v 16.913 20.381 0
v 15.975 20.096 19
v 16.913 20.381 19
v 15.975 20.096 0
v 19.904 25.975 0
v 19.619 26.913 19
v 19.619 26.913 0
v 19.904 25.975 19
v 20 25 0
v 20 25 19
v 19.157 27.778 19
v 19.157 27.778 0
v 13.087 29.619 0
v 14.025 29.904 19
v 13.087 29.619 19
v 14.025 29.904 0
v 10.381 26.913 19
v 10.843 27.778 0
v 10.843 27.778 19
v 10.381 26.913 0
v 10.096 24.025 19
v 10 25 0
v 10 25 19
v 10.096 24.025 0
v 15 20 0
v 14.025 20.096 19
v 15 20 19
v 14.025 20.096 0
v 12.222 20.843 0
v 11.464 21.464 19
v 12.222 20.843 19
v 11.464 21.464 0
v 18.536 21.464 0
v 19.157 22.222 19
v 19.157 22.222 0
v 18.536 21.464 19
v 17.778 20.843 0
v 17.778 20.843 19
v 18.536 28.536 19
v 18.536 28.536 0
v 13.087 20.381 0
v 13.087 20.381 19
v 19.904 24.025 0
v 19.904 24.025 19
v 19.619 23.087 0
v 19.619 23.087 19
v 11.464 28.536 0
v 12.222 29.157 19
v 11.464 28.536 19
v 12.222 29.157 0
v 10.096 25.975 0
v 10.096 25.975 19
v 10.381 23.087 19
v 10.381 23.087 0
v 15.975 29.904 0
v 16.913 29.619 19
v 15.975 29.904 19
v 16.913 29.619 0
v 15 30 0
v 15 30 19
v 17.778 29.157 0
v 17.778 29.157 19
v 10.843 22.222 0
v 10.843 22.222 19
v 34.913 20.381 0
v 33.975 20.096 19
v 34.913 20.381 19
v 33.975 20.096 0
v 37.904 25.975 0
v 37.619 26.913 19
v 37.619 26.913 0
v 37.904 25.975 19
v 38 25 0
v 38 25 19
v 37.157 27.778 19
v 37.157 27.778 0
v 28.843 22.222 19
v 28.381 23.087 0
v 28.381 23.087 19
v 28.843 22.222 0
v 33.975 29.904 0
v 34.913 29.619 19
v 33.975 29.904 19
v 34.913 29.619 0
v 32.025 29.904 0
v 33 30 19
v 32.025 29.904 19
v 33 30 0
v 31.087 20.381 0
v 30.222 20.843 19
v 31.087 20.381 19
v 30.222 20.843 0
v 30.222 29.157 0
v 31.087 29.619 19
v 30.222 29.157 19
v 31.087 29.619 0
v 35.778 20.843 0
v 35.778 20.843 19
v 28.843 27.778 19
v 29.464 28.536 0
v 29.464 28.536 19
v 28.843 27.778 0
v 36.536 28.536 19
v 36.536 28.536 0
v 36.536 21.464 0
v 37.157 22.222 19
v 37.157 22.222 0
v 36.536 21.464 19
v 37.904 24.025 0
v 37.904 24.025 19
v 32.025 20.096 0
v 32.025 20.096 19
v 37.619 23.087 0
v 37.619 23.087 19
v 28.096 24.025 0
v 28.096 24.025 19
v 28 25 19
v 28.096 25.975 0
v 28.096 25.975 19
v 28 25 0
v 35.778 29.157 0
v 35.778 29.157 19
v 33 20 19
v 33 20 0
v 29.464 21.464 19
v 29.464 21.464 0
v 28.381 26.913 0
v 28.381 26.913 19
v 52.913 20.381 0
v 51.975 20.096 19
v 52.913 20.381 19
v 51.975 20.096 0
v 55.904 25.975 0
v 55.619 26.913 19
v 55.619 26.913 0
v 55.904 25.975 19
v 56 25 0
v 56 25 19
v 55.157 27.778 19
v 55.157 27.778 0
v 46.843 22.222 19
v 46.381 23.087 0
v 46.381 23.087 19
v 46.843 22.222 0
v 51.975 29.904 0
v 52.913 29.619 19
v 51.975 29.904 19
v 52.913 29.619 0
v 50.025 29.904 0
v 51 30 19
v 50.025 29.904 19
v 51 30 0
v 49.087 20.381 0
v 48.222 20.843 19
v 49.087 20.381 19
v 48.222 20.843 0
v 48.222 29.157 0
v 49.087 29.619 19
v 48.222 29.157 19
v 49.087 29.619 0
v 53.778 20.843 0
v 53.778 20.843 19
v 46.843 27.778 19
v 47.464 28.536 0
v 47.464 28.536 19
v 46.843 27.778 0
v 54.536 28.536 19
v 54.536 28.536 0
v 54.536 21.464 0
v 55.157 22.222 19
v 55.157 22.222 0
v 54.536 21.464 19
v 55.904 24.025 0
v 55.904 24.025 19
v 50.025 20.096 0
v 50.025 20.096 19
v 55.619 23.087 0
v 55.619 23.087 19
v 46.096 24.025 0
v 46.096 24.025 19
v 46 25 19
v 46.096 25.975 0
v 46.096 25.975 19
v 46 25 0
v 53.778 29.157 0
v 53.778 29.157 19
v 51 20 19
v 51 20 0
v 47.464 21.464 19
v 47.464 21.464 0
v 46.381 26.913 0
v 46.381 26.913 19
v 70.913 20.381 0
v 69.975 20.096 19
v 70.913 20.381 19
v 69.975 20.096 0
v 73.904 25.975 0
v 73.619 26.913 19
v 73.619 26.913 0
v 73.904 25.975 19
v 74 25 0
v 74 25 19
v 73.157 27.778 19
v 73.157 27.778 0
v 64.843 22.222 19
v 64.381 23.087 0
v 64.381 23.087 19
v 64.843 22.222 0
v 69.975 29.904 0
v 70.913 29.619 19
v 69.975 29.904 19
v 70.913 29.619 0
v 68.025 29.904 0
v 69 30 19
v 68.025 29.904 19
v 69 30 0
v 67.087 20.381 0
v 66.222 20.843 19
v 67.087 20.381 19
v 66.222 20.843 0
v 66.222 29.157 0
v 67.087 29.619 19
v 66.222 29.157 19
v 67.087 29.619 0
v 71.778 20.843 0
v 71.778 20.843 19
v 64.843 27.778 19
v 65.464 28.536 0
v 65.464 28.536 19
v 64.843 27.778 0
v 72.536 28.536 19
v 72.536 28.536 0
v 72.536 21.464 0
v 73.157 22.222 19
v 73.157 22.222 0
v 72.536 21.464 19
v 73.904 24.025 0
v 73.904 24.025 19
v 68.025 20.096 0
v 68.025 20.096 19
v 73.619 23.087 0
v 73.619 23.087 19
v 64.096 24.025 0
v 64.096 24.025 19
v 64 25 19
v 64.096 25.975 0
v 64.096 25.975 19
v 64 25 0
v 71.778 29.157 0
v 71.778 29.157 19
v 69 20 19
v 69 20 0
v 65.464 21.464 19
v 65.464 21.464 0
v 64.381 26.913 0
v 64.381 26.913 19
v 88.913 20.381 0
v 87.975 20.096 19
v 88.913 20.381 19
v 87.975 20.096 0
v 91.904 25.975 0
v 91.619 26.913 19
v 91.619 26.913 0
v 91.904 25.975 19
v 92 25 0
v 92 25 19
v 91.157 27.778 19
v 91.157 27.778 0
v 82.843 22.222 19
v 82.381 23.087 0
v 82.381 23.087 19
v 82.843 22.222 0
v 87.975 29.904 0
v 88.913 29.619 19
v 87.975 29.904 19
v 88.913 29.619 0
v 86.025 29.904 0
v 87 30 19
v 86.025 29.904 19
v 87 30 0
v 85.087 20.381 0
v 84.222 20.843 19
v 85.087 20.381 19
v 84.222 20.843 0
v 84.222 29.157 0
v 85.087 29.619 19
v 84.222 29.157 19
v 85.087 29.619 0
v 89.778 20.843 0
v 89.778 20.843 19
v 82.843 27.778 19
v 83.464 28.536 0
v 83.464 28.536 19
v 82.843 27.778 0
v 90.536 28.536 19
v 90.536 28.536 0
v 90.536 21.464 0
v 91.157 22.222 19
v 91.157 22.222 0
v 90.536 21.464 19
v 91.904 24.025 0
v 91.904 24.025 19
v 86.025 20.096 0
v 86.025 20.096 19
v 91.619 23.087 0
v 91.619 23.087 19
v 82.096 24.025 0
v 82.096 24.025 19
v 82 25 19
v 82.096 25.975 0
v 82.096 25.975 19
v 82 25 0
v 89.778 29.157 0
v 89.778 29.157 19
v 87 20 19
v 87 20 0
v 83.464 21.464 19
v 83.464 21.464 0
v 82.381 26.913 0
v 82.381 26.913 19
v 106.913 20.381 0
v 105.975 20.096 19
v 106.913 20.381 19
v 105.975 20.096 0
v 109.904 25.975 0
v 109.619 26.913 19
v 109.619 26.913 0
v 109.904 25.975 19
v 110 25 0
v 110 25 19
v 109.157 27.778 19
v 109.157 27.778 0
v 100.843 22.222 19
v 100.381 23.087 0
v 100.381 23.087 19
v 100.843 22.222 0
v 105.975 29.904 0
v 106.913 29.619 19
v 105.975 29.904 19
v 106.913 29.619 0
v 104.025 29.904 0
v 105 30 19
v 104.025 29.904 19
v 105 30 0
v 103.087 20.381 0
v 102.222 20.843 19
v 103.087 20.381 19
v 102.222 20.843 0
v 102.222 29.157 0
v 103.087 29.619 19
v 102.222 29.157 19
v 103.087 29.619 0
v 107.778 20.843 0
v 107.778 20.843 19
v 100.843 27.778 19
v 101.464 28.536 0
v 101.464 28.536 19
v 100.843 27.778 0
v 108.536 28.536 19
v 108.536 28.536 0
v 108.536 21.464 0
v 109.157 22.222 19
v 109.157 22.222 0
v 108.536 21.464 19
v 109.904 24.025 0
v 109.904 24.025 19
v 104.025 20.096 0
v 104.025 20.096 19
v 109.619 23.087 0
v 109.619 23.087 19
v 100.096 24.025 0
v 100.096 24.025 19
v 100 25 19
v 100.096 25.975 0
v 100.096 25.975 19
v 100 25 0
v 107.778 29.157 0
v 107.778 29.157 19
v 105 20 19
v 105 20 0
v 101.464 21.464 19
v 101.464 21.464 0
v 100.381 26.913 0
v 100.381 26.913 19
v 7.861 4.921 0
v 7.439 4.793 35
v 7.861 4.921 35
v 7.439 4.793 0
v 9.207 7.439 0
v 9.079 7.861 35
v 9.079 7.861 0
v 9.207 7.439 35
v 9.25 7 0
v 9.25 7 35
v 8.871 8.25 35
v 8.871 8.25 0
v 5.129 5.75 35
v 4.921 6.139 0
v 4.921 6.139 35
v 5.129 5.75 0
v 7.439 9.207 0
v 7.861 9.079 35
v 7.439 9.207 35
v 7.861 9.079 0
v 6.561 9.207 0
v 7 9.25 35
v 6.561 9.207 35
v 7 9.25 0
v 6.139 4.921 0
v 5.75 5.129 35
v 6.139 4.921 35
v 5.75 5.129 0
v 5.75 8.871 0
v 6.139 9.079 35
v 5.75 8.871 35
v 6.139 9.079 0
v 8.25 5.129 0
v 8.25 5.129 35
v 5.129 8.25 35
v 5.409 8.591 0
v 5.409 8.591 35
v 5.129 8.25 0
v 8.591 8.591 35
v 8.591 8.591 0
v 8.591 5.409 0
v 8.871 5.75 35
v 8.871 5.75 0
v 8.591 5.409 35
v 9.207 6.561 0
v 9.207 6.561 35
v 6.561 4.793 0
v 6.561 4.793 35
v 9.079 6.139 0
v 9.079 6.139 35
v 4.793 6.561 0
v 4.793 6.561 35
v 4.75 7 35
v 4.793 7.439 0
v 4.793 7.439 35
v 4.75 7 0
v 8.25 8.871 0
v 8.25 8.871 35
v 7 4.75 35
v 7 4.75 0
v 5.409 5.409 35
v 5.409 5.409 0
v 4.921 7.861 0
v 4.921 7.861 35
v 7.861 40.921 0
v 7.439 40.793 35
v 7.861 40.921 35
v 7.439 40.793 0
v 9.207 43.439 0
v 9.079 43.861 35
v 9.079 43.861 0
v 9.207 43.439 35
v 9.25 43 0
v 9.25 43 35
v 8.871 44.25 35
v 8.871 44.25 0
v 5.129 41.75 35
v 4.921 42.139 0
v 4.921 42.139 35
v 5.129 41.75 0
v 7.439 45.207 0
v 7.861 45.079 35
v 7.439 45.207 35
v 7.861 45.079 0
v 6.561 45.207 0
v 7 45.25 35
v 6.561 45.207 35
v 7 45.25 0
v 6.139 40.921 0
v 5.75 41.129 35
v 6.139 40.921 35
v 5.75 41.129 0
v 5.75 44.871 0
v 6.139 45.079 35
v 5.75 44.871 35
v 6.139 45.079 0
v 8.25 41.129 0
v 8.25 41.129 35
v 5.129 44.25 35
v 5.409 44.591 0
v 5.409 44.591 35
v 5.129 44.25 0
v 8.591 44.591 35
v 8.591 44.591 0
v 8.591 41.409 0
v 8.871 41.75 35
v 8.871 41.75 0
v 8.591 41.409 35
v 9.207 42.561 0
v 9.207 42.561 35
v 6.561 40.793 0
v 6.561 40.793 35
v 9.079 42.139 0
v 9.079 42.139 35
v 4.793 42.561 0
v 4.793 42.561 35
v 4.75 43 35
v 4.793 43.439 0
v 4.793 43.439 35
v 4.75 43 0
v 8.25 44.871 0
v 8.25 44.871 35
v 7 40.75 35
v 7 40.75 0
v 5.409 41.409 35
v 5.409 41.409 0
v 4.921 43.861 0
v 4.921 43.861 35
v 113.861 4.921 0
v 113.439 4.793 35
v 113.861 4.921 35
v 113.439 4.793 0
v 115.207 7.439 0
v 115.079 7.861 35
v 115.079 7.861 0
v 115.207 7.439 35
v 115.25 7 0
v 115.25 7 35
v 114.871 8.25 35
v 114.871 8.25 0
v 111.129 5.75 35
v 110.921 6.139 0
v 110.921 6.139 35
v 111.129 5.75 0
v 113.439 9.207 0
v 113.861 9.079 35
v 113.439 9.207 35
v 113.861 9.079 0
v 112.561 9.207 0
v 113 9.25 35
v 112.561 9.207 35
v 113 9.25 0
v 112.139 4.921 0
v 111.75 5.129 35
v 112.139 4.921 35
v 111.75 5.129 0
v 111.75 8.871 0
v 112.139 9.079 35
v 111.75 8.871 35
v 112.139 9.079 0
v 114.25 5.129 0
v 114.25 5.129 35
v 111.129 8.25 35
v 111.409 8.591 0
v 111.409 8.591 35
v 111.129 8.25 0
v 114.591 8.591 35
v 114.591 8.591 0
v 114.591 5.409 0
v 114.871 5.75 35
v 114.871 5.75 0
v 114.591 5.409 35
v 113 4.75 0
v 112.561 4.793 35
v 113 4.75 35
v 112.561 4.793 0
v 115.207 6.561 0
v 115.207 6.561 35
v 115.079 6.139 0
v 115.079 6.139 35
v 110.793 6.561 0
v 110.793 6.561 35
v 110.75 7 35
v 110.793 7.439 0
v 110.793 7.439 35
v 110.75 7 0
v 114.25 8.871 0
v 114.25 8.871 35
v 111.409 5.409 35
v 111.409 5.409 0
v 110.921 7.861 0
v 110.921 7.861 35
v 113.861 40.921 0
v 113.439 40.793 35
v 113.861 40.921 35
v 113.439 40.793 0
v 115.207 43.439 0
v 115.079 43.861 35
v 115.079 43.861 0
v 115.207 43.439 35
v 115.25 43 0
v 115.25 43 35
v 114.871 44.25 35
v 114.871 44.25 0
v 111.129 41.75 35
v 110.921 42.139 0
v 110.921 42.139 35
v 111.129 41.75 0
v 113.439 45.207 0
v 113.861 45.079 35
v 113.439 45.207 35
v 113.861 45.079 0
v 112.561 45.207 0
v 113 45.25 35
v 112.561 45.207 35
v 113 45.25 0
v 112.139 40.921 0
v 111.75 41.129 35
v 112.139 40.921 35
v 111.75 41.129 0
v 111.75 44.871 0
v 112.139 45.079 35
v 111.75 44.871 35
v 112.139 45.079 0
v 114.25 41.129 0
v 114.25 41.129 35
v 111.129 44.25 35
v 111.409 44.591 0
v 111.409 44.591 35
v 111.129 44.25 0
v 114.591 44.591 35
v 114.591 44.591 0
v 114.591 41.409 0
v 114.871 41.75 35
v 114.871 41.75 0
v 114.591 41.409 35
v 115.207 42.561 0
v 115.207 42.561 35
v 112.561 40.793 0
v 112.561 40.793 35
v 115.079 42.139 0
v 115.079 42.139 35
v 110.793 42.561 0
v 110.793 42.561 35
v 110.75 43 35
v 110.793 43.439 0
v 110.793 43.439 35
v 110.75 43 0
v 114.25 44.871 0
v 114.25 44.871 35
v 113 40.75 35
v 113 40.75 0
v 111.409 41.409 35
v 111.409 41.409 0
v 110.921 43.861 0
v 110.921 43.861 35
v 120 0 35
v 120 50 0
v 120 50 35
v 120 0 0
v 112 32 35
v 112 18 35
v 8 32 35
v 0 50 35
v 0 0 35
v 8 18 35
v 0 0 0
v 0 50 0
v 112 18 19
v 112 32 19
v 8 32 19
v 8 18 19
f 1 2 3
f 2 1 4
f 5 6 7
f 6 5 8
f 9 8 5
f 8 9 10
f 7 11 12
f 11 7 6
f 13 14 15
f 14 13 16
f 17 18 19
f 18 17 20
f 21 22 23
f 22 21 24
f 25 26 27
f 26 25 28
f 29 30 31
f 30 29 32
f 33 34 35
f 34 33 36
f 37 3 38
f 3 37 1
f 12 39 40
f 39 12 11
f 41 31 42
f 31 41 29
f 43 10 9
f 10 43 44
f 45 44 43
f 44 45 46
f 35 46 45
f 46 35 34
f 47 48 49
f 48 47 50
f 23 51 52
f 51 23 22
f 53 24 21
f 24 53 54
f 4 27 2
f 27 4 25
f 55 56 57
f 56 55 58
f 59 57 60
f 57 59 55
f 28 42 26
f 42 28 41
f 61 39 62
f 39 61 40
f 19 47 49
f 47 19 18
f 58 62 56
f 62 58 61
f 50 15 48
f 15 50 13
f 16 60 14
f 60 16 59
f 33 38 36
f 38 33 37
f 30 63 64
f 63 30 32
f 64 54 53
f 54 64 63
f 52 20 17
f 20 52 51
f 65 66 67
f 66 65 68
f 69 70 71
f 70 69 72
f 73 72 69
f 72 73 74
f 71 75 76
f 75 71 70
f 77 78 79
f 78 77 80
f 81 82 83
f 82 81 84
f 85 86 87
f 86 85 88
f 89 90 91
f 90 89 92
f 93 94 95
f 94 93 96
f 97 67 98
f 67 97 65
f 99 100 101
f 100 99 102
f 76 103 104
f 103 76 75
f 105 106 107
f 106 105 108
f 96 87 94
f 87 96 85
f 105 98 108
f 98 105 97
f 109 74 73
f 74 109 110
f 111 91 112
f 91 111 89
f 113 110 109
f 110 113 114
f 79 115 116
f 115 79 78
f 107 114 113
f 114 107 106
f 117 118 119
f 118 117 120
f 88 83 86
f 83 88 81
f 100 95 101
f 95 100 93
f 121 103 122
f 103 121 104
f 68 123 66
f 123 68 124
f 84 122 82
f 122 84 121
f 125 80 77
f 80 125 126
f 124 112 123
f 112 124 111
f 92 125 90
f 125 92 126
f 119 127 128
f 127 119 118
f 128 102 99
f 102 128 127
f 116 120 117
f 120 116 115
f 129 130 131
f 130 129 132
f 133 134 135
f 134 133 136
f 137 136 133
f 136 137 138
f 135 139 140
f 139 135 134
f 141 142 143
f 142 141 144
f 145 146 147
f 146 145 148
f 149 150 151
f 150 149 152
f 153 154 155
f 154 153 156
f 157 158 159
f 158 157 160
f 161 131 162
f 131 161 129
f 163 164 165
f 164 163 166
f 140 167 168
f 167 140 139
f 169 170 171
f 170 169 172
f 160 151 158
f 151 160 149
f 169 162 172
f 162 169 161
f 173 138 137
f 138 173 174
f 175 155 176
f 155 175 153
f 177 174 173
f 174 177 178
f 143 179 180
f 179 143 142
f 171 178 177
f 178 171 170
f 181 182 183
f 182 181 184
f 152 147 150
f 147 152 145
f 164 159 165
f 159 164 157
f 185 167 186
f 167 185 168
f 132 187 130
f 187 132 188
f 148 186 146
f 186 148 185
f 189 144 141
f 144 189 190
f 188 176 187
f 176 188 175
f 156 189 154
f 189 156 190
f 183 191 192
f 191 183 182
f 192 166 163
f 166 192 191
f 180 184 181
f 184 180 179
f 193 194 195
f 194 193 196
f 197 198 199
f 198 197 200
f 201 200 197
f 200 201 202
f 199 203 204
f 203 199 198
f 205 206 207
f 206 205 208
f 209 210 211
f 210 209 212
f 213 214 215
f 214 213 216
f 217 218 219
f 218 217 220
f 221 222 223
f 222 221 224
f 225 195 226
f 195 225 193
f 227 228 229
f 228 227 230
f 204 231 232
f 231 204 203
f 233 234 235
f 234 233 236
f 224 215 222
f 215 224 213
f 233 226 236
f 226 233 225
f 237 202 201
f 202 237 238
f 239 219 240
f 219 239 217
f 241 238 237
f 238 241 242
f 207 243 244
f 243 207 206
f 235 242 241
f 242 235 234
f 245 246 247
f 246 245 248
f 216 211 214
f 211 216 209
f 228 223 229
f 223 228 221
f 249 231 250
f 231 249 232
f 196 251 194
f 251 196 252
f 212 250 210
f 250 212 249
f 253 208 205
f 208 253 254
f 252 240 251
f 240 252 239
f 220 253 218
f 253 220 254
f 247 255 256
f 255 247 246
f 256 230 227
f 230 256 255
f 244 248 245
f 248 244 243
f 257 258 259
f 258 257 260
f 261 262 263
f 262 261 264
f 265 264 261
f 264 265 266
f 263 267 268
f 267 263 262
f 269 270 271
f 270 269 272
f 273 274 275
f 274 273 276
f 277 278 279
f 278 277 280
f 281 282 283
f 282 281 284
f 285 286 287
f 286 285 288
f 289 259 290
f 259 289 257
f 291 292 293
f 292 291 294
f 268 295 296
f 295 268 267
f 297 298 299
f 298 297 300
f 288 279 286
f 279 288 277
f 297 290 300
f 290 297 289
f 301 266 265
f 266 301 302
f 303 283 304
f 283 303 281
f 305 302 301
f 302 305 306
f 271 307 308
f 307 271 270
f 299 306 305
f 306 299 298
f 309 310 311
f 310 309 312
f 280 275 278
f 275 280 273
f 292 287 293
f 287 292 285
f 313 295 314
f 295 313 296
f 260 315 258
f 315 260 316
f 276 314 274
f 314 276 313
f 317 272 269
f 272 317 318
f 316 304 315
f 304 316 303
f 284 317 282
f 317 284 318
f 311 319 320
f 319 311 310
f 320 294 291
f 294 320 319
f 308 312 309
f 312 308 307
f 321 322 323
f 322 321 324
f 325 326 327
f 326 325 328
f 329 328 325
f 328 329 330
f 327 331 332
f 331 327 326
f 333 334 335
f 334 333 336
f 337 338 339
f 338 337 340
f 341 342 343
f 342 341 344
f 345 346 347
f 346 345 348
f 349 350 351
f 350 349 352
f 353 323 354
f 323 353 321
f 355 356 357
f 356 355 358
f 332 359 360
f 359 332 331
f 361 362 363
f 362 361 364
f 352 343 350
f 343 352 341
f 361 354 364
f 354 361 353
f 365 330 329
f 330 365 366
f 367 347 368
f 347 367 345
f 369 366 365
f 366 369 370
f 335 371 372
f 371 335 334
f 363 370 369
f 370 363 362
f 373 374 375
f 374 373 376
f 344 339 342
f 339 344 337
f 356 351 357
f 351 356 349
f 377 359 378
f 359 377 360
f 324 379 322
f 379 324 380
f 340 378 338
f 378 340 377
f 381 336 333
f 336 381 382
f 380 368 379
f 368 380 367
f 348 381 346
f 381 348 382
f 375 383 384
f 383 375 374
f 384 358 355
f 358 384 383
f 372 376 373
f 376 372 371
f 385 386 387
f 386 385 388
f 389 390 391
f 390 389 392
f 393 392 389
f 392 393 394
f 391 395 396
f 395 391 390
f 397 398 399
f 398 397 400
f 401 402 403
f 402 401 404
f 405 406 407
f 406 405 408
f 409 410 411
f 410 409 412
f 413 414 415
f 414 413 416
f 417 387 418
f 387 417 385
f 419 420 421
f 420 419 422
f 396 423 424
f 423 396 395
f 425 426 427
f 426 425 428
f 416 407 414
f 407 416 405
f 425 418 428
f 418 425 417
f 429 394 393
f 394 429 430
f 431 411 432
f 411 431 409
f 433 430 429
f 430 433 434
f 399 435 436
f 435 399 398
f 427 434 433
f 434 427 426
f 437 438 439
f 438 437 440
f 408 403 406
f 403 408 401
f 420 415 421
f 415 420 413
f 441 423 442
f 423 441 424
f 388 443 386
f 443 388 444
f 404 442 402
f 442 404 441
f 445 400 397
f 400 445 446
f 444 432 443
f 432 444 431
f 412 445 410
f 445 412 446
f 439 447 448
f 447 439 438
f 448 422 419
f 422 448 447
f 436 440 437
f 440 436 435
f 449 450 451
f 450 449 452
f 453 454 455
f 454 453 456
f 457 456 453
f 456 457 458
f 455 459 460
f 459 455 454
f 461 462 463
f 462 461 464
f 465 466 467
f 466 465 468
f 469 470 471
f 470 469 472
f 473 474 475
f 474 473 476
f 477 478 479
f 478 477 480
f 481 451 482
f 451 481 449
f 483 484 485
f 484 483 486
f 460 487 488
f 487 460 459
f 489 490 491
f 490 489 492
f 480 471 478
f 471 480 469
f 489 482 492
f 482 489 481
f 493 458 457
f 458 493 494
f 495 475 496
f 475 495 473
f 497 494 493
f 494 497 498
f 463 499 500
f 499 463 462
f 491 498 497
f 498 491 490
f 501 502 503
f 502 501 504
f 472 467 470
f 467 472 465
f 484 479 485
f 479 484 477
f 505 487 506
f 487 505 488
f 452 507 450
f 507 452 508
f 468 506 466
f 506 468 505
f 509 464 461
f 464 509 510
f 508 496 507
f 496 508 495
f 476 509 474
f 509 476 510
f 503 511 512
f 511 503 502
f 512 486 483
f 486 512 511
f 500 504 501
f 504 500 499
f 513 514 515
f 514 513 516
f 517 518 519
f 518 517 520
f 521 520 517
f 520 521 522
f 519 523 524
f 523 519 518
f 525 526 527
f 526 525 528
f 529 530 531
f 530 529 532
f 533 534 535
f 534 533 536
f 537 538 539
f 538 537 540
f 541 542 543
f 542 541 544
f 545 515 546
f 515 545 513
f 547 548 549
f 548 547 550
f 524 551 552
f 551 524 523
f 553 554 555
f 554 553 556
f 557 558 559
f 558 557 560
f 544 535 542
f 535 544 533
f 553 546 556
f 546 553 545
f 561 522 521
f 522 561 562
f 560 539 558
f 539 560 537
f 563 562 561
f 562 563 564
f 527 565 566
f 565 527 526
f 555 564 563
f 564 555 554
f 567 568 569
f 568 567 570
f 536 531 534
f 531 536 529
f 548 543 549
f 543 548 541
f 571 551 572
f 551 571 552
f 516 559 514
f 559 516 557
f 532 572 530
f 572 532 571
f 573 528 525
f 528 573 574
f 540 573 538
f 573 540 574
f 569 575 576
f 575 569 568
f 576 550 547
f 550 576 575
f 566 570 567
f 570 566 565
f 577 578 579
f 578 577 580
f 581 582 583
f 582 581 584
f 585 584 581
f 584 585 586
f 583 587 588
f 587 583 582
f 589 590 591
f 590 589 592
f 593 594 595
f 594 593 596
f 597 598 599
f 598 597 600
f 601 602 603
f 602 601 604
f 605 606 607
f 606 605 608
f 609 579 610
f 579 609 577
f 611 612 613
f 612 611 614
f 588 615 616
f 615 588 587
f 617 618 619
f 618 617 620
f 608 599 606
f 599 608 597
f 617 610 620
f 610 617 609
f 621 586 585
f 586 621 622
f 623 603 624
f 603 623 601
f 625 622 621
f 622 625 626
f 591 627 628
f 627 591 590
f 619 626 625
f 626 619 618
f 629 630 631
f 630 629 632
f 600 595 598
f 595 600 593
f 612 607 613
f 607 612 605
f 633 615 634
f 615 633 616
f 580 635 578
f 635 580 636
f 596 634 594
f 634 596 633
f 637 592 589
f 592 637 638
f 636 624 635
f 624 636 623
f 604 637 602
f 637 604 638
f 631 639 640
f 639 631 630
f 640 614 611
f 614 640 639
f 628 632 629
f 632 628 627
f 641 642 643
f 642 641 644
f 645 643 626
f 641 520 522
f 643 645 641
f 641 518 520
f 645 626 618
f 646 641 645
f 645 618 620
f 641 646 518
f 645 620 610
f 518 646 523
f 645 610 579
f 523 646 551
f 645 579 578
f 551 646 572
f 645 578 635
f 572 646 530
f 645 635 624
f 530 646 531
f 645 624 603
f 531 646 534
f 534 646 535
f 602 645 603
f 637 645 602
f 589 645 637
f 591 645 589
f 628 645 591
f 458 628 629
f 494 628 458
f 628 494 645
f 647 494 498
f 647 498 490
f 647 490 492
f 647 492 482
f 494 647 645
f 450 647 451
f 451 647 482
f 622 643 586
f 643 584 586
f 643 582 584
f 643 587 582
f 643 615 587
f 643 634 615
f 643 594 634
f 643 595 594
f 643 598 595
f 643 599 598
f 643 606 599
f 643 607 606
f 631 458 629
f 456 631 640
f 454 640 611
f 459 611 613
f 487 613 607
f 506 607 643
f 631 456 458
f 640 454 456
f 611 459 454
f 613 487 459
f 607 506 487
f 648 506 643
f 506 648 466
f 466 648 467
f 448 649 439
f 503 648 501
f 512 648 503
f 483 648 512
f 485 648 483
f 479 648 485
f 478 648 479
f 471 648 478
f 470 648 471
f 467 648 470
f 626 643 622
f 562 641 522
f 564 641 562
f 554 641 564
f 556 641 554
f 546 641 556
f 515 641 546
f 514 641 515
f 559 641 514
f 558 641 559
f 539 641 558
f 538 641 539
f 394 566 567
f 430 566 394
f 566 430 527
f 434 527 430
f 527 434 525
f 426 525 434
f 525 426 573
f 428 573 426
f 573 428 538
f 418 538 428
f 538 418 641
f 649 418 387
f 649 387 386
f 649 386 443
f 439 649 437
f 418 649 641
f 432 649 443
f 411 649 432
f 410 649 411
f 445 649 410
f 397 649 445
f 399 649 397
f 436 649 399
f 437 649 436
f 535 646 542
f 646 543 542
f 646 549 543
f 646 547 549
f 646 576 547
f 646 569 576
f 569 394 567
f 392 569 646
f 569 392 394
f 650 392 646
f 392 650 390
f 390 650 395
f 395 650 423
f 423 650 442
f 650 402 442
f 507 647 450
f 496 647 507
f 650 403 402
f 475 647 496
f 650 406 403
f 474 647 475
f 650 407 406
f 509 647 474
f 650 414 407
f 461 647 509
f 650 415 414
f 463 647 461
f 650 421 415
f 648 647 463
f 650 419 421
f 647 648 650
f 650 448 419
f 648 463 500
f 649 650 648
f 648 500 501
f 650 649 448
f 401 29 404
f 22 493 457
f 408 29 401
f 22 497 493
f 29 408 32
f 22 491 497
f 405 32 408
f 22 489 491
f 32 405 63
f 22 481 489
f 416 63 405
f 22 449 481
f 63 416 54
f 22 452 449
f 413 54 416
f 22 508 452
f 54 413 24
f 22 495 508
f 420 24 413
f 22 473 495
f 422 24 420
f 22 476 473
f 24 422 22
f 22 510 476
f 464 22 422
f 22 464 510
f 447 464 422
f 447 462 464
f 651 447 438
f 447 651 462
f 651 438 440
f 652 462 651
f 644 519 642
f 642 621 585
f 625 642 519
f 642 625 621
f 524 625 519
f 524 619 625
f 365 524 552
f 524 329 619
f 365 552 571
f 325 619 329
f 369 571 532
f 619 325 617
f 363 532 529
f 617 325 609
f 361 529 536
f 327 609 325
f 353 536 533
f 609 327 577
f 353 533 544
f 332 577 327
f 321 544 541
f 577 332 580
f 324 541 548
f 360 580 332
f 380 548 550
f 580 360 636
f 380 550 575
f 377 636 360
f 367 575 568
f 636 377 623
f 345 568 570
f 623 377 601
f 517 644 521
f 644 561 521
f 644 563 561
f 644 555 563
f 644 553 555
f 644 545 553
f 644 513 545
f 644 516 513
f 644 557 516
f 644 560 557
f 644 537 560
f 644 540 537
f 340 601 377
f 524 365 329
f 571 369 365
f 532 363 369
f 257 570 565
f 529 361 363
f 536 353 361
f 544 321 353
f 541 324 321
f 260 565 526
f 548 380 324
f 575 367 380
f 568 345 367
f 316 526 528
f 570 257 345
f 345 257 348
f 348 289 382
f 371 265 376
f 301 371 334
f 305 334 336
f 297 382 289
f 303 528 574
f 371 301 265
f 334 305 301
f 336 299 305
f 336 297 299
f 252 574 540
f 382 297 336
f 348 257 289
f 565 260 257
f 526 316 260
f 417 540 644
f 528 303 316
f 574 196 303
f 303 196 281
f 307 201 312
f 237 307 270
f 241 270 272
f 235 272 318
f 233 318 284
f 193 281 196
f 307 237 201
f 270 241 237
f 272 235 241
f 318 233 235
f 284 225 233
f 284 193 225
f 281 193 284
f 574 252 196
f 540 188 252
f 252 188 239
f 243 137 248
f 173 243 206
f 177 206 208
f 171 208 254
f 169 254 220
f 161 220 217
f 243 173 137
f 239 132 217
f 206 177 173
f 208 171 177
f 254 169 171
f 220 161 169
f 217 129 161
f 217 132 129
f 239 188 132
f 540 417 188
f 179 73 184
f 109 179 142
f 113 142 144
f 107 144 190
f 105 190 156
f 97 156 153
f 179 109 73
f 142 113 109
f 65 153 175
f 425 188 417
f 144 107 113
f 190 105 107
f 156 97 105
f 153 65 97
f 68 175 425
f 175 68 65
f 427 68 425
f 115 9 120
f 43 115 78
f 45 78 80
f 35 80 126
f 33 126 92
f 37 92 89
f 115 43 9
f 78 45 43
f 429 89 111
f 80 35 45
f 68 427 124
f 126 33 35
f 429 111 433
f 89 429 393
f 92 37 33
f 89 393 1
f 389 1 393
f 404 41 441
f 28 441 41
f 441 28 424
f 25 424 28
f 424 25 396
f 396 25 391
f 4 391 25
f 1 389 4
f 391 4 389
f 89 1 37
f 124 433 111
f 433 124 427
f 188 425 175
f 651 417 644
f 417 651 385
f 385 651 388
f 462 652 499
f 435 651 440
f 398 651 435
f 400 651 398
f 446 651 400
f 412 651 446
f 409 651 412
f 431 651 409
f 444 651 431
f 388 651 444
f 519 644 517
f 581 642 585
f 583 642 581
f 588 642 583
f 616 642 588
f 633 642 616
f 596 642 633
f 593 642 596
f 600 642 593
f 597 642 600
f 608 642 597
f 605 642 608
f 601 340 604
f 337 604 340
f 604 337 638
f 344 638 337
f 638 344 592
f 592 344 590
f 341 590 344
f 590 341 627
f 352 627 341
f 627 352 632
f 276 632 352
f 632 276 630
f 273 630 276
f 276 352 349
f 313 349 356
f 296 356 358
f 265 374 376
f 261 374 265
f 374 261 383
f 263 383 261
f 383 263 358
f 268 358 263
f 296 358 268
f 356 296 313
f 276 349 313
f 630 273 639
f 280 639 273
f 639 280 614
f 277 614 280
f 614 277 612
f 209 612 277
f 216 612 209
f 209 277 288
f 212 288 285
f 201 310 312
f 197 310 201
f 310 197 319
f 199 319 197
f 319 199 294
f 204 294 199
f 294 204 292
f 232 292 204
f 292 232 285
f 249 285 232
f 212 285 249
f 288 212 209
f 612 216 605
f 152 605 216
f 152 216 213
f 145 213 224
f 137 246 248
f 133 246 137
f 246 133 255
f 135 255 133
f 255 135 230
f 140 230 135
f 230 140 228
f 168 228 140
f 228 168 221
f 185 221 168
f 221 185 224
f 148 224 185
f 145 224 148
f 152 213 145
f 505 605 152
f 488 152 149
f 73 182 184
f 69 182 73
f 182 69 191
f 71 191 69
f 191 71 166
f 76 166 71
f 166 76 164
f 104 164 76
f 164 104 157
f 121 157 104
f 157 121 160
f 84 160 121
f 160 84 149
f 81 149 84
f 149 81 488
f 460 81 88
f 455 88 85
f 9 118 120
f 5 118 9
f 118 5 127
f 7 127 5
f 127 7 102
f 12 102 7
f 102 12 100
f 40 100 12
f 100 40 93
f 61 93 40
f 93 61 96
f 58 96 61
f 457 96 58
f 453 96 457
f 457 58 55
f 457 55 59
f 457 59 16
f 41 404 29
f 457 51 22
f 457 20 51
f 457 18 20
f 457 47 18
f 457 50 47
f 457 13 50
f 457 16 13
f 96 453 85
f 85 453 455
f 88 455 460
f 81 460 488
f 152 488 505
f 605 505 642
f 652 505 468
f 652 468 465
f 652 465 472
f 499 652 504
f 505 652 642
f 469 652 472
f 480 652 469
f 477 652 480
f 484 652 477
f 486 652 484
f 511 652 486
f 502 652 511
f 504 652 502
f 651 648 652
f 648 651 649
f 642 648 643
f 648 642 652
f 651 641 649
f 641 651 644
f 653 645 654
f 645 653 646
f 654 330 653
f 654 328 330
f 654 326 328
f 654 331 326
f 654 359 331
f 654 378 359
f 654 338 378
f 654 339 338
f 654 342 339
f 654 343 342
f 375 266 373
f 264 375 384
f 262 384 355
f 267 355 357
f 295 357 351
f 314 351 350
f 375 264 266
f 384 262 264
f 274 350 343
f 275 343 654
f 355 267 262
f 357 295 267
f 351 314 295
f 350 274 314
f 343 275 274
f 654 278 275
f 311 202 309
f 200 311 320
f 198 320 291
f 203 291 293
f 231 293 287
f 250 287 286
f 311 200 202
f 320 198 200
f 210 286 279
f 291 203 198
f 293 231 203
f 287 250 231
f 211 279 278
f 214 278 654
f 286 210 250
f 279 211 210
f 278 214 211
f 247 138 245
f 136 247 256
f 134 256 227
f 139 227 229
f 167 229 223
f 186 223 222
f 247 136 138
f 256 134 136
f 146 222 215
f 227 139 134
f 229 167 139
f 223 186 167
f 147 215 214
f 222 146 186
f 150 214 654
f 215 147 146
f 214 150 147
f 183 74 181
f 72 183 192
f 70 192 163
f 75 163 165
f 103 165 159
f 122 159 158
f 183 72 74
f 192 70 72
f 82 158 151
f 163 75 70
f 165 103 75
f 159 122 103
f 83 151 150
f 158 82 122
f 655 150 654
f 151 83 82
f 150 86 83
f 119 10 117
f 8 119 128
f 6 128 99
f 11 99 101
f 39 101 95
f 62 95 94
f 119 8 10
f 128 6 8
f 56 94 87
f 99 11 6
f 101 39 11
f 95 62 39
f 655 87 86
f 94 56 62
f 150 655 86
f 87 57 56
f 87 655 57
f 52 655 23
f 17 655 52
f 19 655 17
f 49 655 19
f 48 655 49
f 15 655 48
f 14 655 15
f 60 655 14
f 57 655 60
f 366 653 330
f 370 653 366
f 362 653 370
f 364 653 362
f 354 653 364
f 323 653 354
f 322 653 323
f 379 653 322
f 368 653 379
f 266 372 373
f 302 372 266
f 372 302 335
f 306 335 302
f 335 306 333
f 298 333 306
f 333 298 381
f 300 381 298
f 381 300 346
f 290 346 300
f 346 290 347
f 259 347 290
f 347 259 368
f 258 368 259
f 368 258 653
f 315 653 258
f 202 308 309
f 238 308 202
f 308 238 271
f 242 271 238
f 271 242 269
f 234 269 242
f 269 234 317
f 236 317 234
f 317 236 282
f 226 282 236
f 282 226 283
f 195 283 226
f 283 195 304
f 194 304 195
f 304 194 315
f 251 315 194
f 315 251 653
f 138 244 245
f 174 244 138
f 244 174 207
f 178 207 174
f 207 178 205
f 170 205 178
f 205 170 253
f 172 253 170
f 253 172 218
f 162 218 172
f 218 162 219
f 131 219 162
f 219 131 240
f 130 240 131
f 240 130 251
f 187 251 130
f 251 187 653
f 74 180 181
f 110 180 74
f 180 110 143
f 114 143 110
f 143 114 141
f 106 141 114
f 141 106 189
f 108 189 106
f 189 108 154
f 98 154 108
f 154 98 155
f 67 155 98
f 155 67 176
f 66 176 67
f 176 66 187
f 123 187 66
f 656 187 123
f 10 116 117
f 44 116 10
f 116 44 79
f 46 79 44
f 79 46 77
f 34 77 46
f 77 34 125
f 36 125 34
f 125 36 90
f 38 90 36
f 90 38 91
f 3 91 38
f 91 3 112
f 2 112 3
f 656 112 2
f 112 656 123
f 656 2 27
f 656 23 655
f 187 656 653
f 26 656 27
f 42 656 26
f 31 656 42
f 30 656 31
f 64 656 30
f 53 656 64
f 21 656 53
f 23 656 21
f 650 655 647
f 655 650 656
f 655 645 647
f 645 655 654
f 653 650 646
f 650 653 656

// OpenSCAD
$fn = 32;

// ----------------------------------------------------------------------
// Manifold block: gallery_top manifold
// ----------------------------------------------------------------------

// --- parameters (mm) ---
block_l = 120;            // block length, X
block_w = 50;             // block width, Y
block_h = 35;             // block height, Z
port_d = 10;              // port bore diameter
port_pitch = 18;          // port pitch along X
gallery_d = 14;           // top gallery width, Y
gallery_depth = 16;       // gallery pocket depth
wall_p = 8;               // gallery end wall thickness, X
mnt_d = 4.5;              // mounting hole diameter
mnt_in = 7;               // mounting hole inset from the edges
fit_tol = 0.1;            // tolerance for press fits, mm
free_tol = 0.5;           // tolerance for clearance fits, mm

n_ports = 6;  // ports in the row
port_x0 = (block_l - (n_ports - 1) * port_pitch) / 2;  // first port X

difference() {
  cube([block_l, block_w, block_h]);
  for (i = [0 : n_ports - 1])
    translate([port_x0 + i * port_pitch, block_w / 2, -1])
      cylinder(h = block_h + 2, d = port_d);
  translate([wall_p, block_w / 2 - gallery_d / 2, block_h - gallery_depth])
    cube([block_l - 2 * wall_p, gallery_d, gallery_depth + 1]);
  for (cx = [mnt_in, block_l - mnt_in])
    for (cy = [mnt_in, block_w - mnt_in])
      translate([cx, cy, -1]) cylinder(h = block_h + 2, d = mnt_d);
}
